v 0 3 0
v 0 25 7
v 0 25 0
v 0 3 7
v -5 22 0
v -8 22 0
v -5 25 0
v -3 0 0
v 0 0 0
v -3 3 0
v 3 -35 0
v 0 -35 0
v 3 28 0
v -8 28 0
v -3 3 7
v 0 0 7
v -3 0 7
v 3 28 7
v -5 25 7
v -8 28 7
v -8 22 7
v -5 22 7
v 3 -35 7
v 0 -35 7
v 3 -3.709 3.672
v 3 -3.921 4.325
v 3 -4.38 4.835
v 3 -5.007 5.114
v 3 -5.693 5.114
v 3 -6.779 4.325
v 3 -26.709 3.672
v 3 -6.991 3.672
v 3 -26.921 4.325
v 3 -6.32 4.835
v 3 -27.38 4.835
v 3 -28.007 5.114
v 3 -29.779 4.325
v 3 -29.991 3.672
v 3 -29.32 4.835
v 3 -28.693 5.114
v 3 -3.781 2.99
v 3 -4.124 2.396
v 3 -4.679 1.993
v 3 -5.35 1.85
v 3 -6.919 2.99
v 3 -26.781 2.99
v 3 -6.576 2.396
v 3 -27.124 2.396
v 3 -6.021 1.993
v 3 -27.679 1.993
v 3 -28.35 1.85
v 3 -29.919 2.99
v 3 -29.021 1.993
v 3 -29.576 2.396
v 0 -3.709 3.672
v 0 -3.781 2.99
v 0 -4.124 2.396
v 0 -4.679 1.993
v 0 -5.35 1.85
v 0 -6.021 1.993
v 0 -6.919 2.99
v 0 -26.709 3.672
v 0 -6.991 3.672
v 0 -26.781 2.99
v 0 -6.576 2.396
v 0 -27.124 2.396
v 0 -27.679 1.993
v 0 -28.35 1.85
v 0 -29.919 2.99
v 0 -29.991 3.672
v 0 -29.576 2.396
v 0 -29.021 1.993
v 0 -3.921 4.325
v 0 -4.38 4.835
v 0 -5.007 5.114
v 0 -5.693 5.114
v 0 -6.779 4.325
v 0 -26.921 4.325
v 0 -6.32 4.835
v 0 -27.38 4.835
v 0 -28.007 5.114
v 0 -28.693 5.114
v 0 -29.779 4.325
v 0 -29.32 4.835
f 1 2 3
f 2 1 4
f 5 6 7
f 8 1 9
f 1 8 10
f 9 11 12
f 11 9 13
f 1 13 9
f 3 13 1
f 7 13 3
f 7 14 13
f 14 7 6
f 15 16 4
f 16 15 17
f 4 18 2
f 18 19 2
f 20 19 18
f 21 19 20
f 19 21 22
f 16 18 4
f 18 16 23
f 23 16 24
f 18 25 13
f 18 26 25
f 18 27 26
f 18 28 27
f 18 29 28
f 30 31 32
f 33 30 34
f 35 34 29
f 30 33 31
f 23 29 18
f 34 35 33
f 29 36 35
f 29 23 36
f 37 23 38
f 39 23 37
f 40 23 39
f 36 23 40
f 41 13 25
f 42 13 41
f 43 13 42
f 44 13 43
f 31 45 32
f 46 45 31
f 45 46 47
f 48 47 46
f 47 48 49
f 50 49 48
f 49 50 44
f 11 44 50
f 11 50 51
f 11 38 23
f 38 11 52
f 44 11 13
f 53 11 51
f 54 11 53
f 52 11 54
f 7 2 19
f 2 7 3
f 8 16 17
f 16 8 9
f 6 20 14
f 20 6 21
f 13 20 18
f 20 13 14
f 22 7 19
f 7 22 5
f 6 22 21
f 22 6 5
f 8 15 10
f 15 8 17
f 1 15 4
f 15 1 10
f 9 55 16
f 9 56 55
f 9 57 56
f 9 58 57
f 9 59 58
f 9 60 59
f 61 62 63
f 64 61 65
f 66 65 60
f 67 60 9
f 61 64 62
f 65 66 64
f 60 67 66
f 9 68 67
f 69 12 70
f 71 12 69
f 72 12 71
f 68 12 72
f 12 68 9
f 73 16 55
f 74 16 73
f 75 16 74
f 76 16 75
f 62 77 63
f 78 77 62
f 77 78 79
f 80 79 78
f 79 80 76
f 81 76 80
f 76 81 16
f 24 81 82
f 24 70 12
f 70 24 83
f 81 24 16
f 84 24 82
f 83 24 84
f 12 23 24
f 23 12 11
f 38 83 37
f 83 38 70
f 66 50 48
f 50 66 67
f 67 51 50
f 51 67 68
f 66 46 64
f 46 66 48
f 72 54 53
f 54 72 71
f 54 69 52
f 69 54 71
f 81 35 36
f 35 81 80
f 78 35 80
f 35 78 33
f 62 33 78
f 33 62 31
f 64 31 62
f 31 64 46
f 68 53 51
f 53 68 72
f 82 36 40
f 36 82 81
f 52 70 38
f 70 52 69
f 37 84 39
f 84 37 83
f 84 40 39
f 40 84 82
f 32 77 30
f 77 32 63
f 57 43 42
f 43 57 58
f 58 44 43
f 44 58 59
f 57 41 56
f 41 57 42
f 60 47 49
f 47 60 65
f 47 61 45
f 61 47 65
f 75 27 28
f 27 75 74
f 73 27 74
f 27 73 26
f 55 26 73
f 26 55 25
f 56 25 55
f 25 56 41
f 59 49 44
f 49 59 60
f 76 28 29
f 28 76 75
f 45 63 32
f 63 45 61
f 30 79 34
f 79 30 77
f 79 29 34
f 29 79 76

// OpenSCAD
/*
 * Inspired by the "TinyBoy / Fabrikator mini Cam holder"
 * by "andy_a":
 * http://www.thingiverse.com/thing:1434698
 *
 * Created by:
 * Thomas Buck <xythobuz@xythobuz.de> in April 2016
 *
 * Licensed under the Creative Commons - Attribution - Share alike license.
 */

// -----------------------------------------------------------

bodyHeight = 7;
wallSize = 3;
lipSize = 3;
fullSize = 28;
gap = 5;
length = 35;
bottomOff = 5;
holeDist = 23;
holeSize = 3.3;

$fn = 15;

// -----------------------------------------------------------

module holder() {
    // lower body
    cube([wallSize, fullSize - wallSize, bodyHeight]);

    // upper border
    translate([0, fullSize - wallSize, 0])
        cube([(2 * wallSize) + gap, wallSize, bodyHeight]);

    // upper lip
    translate([wallSize + gap, fullSize - (2 * wallSize), 0])
        cube([wallSize, wallSize, bodyHeight]);

    // lower border
    translate([wallSize, 0, 0])
        cube([lipSize, lipSize, bodyHeight]);
}

module mount() {
    difference() {
        cube([bodyHeight, length, wallSize]);
        
        translate([bodyHeight / 2, bottomOff + (holeSize / 2), -1])
            cylinder(d = holeSize, h = wallSize + 2);
        
        translate([bodyHeight / 2, bottomOff + (holeSize / 2) + holeDist, -1])
            cylinder(d = holeSize, h = wallSize + 2);
    }
}

module whole() {
    translate([0, 0, wallSize])
        rotate([0, 90, 0])
        #holder();

    translate([0, -length, 0])
        mount();
}

// -----------------------------------------------------------

translate([0, 0, bodyHeight])
    rotate([0, 90, 0])
    whole();
